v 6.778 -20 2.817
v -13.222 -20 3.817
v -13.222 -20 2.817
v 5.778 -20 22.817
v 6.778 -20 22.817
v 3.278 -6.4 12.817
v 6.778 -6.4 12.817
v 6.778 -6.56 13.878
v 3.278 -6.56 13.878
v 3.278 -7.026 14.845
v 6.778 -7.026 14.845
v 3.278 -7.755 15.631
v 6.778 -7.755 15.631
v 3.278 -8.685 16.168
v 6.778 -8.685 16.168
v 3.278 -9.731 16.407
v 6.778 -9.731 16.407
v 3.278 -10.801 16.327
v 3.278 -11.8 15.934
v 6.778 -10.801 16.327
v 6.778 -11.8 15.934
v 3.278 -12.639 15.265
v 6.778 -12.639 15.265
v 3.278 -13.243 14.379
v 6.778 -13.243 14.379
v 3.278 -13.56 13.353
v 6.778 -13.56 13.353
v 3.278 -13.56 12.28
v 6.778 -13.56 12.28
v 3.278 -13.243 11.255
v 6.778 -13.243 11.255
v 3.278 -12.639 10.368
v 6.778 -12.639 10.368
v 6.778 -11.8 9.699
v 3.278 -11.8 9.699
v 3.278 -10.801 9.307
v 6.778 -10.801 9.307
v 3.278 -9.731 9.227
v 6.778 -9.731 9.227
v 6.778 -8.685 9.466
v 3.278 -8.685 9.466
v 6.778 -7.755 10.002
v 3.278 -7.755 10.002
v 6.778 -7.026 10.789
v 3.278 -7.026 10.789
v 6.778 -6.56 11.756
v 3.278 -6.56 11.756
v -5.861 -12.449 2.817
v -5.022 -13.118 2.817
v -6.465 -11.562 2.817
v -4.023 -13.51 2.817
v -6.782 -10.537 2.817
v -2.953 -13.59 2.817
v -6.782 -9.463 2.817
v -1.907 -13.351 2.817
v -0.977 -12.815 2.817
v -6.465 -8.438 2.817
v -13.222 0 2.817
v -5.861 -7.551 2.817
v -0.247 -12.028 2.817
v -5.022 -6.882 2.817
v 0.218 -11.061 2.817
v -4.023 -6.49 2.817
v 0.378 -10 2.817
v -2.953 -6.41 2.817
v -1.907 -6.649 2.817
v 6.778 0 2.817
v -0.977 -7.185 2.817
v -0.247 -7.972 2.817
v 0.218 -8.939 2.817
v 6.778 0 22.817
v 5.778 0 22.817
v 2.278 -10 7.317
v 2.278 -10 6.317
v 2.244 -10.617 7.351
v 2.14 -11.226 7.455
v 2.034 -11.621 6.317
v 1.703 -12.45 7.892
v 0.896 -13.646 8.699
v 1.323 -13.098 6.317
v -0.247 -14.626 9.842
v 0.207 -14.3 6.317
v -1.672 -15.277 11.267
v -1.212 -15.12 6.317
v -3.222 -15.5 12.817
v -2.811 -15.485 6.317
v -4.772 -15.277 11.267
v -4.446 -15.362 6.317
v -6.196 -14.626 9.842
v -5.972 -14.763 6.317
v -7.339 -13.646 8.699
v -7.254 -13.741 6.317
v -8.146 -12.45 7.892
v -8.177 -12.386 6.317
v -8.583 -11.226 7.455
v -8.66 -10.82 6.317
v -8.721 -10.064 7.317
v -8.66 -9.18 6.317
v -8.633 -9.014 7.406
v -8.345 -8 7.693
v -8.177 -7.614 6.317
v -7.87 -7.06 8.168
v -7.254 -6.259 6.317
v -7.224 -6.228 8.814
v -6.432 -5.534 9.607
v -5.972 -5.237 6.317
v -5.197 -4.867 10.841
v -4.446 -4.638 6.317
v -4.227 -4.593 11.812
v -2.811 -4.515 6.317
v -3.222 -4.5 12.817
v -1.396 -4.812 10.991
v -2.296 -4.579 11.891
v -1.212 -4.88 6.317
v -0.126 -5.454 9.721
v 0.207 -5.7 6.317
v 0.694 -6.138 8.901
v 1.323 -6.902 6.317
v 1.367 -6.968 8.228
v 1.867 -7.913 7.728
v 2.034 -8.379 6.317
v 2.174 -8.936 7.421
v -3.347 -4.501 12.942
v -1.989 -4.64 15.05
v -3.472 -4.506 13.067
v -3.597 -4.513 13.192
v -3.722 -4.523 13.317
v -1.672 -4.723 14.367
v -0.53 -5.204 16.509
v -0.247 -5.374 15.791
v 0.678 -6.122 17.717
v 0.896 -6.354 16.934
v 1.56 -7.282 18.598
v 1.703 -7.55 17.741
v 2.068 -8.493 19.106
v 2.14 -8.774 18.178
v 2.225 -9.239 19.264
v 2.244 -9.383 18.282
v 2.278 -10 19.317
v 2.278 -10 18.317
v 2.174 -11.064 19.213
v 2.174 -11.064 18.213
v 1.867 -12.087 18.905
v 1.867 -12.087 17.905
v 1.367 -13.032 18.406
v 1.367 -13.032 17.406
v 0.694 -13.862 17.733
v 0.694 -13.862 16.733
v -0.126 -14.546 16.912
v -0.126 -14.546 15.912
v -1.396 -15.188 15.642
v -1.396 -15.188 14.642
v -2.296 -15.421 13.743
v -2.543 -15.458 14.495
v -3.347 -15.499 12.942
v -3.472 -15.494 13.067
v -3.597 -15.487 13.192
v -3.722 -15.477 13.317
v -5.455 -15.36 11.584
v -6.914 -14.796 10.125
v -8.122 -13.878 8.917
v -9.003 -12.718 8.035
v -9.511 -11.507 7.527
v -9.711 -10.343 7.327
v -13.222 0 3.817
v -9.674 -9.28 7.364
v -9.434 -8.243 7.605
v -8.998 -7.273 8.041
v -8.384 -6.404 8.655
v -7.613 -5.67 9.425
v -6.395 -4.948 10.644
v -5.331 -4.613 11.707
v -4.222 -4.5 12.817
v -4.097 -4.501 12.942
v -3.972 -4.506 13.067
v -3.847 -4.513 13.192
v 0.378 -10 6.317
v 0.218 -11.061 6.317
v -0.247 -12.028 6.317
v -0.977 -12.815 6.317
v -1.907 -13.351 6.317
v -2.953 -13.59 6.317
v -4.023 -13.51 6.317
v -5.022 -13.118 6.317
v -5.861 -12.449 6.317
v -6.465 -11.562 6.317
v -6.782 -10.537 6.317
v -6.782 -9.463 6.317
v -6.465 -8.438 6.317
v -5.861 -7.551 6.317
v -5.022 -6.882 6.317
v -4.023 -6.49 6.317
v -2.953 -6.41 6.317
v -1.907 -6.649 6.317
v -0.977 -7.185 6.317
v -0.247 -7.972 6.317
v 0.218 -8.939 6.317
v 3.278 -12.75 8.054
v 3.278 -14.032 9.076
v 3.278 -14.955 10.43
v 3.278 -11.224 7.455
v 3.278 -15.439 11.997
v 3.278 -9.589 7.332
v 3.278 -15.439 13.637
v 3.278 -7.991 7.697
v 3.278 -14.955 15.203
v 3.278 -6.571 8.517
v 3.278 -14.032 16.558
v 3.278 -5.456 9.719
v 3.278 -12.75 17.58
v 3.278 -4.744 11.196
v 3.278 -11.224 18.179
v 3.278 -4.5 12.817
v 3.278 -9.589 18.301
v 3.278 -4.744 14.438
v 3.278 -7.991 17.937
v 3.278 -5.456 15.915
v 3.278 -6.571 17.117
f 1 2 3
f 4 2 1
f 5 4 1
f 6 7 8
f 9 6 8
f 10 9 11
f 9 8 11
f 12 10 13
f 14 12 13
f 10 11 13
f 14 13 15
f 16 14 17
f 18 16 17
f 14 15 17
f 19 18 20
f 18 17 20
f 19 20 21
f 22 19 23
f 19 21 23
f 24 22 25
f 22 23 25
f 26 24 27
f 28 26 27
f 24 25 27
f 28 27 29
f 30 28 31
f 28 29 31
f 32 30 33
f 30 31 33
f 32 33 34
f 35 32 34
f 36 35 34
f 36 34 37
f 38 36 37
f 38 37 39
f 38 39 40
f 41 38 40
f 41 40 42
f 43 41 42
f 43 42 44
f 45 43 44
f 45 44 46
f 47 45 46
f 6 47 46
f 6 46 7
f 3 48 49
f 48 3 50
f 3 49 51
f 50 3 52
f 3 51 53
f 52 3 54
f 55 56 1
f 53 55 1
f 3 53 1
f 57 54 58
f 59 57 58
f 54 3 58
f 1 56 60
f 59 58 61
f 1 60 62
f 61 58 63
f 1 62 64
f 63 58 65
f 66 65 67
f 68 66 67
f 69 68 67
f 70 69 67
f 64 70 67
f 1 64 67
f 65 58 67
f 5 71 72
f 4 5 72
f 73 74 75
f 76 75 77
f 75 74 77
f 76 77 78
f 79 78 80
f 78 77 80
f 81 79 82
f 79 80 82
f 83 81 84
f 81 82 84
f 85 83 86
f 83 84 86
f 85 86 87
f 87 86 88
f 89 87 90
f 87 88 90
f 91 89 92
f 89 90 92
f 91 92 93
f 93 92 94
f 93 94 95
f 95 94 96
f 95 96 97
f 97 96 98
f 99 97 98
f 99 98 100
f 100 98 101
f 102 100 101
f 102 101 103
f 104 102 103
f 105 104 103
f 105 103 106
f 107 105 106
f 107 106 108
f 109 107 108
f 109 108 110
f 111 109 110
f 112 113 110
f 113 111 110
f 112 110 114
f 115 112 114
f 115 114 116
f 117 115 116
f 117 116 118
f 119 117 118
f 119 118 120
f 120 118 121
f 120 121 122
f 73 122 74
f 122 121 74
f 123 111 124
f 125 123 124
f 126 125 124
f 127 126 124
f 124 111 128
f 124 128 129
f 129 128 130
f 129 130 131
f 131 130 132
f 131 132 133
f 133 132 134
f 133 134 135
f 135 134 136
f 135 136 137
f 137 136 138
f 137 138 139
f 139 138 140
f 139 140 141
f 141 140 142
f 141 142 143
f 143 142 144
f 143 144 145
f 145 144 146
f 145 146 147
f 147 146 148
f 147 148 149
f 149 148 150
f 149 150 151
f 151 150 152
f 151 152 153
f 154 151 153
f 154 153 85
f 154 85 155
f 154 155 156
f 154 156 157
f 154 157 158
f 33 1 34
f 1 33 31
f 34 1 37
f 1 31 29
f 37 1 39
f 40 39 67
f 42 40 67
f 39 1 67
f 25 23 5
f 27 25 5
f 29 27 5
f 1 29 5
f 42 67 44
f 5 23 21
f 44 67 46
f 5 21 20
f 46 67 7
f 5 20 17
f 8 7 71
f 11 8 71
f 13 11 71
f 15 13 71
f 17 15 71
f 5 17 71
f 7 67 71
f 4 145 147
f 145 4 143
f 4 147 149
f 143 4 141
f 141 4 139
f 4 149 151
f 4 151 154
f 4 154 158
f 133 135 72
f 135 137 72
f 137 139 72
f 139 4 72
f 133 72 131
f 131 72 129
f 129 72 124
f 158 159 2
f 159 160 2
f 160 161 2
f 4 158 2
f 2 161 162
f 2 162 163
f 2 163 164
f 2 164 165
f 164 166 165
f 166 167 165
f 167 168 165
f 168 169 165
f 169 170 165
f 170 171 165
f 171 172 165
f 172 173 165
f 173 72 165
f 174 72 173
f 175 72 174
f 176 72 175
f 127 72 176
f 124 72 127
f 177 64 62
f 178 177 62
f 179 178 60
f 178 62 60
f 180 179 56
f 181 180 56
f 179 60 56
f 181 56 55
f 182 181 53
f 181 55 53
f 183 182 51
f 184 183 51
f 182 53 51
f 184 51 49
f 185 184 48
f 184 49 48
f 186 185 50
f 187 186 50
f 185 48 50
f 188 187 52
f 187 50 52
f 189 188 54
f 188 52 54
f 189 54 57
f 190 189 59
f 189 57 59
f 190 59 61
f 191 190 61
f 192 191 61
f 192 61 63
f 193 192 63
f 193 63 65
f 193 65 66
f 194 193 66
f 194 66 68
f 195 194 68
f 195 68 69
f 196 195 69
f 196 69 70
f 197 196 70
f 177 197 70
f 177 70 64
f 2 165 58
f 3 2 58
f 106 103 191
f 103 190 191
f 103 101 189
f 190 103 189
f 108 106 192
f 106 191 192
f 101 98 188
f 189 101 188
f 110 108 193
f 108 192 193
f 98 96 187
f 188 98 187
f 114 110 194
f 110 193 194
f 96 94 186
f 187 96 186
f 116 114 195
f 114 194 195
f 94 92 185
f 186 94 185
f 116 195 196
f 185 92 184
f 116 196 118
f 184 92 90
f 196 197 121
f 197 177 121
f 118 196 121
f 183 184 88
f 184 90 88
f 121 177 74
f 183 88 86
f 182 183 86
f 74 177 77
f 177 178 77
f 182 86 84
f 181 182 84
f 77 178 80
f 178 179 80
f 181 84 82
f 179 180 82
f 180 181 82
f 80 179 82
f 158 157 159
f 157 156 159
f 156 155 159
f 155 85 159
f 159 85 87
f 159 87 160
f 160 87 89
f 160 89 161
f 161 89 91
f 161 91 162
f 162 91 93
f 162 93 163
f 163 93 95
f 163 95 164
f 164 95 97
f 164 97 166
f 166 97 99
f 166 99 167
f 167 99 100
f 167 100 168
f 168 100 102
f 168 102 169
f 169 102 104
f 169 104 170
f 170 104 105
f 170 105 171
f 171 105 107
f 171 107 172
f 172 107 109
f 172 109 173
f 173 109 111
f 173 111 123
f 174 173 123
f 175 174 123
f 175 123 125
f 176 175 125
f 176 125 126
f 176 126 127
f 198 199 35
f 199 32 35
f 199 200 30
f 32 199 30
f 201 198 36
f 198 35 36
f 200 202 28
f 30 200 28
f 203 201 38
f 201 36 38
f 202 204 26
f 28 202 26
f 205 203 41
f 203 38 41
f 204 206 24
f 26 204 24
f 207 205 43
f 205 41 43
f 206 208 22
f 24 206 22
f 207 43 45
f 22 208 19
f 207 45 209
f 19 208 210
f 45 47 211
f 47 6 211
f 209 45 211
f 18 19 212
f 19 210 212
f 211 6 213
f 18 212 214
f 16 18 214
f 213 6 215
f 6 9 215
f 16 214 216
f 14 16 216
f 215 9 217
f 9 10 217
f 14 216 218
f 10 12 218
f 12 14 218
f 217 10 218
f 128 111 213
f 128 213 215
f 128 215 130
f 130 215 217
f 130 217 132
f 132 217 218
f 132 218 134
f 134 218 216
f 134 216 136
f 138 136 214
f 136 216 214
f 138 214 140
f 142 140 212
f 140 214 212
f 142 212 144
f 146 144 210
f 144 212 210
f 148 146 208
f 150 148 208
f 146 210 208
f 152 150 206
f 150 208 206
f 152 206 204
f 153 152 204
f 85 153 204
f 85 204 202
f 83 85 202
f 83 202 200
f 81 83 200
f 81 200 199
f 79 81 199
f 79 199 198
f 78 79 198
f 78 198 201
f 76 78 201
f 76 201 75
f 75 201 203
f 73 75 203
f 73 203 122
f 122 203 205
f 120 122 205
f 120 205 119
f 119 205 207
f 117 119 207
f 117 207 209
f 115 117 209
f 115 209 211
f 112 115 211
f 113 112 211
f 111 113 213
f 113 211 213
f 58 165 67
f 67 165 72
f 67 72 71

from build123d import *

# Parameters (mm, degrees)
F1_DEPTH = 20
F3_R     = 3.6
F4_DEPTH = 20.001
F2_R     = 3.6
F5_DEPTH = 20.001
F6_START = -3.5
F3_R_2   = 5.5
F6_DEPTH = 16.501
F7_START = -3.5
F2_R_2   = 5.5
F7_DEPTH = 16.501


with BuildPart() as f1:
    # F0 (on Front) → F1 (new body)
    with BuildSketch(Plane.XZ):
        Polygon((-13.2217891409, 3.8167946823), (-13.2217891409, 2.8167946823), (6.7782108591, 2.8167946823), (6.7782108591, 22.8167946823), (5.7782108591, 22.8167946823), align=None)
    extrude(amount=F1_DEPTH)

    # F3 (on face) → F4 (cut, through all)
    with BuildSketch(Plane.YZ.offset(6.7782108591)):
        with Locations((-10, 12.8167946823)):
            Circle(F3_R)
    extrude(amount=-F4_DEPTH, mode=Mode.SUBTRACT)

    # F2 (on face) → F5 (cut, through all)
    with BuildSketch(Plane(origin=(0, 0, 2.8167946823), x_dir=(1, 0, 0), z_dir=(0, 0, -1))):
        with Locations((-3.2217891409, 10)):
            Circle(F2_R)
    extrude(amount=-F5_DEPTH, mode=Mode.SUBTRACT)

    # F3 (on face) → F6 (cut)
    with BuildSketch(Plane.YZ.offset(6.7782108591).offset(F6_START)):
        with Locations((-10, 12.8167946823)):
            Circle(F3_R_2)
        with Locations((-10, 12.8167946823)):
            Circle(F3_R, mode=Mode.SUBTRACT)
    extrude(amount=-F6_DEPTH, mode=Mode.SUBTRACT)

    # F2 (on face) → F7 (cut)
    with BuildSketch(Plane(origin=(0, 0, 2.8167946823), x_dir=(1, 0, 0), z_dir=(0, 0, -1)).offset(F7_START)):
        with Locations((-3.2217891409, 10)):
            Circle(F2_R_2)
        with Locations((-3.2217891409, 10)):
            Circle(F2_R, mode=Mode.SUBTRACT)
    extrude(amount=-F7_DEPTH, mode=Mode.SUBTRACT)


solid = f1.part
